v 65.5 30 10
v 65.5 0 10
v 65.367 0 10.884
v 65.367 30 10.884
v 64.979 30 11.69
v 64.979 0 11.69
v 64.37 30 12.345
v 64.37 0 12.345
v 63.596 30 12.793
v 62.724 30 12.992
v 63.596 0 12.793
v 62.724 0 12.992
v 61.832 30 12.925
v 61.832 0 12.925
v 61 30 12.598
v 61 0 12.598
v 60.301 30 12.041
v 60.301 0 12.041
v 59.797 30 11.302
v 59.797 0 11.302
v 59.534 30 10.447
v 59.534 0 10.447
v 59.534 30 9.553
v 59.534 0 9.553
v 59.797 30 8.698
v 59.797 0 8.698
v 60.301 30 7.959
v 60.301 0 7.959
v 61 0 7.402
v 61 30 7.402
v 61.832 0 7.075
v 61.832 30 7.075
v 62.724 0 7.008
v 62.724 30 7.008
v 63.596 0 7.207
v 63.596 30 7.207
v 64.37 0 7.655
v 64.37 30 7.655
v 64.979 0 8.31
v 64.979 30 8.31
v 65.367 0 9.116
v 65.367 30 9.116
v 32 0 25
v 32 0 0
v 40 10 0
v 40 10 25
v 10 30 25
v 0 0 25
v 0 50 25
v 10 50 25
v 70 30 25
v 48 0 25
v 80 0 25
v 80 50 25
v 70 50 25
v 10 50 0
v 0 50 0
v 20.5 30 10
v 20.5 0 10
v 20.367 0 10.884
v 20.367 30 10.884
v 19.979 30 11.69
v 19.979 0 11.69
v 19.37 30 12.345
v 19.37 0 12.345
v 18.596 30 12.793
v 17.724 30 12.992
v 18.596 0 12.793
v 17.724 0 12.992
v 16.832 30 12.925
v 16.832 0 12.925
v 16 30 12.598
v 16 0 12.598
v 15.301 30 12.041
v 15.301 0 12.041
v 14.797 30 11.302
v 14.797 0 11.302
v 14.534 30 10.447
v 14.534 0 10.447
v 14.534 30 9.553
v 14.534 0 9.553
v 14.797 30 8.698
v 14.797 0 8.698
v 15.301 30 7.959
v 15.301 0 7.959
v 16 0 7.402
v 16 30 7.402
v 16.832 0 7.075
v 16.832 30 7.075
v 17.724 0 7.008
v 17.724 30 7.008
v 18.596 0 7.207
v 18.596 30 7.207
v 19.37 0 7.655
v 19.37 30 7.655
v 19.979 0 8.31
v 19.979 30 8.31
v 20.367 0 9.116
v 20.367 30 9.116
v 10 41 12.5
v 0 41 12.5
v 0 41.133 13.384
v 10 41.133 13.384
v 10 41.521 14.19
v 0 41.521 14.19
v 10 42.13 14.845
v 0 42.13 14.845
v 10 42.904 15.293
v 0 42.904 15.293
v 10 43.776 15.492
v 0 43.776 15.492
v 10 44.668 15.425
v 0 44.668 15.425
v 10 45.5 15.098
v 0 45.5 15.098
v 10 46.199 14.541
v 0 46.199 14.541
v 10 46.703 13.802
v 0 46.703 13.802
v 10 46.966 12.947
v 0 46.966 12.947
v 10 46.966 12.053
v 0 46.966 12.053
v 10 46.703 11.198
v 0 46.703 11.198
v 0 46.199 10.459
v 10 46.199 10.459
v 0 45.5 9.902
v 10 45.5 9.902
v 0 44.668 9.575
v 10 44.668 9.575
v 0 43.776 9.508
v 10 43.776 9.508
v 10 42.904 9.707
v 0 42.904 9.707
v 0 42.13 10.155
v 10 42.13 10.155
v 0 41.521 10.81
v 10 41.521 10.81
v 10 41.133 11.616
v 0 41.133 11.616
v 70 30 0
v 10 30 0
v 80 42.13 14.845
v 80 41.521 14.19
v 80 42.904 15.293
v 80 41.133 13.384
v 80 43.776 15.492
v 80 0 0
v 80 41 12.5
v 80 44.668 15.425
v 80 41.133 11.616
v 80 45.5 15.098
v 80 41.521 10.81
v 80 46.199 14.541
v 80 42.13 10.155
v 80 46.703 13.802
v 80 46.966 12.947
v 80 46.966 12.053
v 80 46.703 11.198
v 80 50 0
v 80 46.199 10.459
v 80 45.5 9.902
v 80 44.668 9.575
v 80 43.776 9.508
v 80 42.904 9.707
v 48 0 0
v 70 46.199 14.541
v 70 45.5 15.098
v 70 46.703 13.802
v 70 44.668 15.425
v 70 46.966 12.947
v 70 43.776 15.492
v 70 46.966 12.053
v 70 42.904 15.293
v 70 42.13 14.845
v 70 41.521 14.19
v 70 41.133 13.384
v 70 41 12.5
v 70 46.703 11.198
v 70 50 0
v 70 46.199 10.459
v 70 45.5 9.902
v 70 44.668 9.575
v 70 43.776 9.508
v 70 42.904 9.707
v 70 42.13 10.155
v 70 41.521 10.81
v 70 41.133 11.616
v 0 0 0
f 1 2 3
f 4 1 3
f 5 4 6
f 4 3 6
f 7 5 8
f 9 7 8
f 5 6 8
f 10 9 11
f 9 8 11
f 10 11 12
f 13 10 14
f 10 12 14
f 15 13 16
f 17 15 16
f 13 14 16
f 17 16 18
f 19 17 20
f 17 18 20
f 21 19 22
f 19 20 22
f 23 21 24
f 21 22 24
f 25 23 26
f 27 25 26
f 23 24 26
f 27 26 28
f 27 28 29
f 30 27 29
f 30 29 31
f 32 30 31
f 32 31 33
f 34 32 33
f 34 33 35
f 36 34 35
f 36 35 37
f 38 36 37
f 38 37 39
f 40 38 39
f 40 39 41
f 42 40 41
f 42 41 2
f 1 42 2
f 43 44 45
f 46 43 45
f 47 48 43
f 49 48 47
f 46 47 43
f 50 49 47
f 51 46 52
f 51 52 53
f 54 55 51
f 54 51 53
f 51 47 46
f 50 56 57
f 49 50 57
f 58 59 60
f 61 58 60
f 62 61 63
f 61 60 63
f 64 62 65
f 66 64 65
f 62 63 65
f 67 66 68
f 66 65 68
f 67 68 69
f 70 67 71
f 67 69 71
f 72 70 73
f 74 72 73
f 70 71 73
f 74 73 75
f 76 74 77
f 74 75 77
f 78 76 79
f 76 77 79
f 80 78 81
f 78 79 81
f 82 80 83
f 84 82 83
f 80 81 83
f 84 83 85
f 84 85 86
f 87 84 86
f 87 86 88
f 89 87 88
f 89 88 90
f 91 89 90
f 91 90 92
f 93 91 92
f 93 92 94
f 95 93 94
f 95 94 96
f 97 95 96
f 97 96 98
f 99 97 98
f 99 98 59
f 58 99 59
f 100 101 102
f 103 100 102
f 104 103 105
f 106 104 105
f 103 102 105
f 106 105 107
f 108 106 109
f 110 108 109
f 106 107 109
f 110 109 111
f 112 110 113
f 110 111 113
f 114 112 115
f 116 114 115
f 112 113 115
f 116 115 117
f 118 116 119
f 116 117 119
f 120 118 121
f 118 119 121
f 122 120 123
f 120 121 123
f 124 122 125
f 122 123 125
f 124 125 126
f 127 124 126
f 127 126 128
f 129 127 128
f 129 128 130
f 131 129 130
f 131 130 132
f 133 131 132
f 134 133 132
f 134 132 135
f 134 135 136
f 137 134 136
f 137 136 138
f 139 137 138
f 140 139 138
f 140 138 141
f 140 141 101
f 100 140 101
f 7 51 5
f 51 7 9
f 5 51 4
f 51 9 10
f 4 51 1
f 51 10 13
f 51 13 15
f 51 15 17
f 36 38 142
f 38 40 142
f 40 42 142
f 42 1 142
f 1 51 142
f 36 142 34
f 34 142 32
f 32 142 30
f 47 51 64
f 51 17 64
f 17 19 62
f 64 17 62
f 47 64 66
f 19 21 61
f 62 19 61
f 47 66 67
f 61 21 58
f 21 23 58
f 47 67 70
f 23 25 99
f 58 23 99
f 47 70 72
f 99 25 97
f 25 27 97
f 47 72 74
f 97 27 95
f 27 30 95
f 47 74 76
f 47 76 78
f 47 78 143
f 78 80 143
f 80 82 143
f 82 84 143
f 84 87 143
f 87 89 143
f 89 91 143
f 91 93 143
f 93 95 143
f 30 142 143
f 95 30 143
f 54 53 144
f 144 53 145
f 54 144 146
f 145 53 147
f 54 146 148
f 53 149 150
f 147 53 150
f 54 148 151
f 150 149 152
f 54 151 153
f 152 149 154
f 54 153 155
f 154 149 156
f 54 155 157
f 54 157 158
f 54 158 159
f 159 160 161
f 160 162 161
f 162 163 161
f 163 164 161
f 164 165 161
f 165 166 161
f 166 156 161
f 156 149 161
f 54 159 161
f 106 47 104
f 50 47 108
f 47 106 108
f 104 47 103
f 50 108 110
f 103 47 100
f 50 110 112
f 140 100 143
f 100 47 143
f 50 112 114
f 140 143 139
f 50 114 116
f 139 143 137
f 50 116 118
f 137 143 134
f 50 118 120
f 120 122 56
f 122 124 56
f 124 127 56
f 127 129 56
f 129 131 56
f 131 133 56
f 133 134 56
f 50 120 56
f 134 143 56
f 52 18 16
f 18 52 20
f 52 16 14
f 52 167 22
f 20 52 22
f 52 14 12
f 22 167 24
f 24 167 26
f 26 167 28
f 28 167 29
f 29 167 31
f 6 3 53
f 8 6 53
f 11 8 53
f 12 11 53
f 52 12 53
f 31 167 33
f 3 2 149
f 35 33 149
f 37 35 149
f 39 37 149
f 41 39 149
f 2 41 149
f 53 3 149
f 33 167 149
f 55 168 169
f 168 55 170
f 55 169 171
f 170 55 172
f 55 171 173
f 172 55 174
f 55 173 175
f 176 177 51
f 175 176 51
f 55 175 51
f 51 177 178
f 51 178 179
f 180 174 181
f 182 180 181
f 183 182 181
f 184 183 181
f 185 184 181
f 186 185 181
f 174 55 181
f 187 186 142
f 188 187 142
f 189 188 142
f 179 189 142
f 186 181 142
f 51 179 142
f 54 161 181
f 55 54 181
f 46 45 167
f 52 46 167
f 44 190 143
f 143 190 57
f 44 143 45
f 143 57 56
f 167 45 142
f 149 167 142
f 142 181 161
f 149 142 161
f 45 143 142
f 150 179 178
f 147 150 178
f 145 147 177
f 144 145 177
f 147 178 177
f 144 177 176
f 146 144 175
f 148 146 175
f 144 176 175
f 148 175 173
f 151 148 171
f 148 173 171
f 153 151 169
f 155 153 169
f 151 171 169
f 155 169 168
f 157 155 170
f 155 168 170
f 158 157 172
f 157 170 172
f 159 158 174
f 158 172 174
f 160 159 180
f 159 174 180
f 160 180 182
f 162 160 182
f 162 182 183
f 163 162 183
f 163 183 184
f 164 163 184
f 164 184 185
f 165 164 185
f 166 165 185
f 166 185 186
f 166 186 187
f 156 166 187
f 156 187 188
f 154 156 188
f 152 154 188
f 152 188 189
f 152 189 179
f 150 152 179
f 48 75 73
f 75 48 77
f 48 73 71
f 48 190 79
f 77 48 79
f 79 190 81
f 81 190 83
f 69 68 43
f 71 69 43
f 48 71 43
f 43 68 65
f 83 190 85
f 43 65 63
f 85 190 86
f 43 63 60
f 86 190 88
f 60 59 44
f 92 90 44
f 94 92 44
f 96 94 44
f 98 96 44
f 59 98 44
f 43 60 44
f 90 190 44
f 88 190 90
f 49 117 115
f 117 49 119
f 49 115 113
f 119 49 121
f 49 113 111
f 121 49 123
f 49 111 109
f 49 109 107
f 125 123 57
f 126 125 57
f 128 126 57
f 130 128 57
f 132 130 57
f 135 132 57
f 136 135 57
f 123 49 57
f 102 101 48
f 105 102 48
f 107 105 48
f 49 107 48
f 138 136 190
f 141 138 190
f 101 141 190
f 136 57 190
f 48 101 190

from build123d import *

# Parameters (mm, degrees)
F1_DEPTH = 25
F2_R     = 3
F3_DEPTH = 50.001
F4_R     = 3
F5_DEPTH = 80.001


with BuildPart() as f1:
    # F0 (on Top) → F1 (new body)
    with BuildSketch(Plane.XY):
        Polygon((10, 50), (0, 50), (0, 0), (32, 0), (40, 10), (48, 0), (80, 0), (80, 50), (70, 50), (70, 30), (10, 30), align=None)
    extrude(amount=F1_DEPTH)

    # F2 (on face) → F3 (cut, through all)
    with BuildSketch(Plane.XZ):
        with Locations((17.5, 10)):
            Circle(F2_R)
        with Locations((62.5, 10)):
            Circle(F2_R)
    extrude(amount=-F3_DEPTH, mode=Mode.SUBTRACT)

    # F4 (on face) → F5 (cut, through all)
    with BuildSketch(Plane(origin=(0, 0, 0), x_dir=(0, -1, 0), z_dir=(-1, 0, 0))):
        with Locations((-44, 12.5)):
            Circle(F4_R)
    extrude(amount=-F5_DEPTH, mode=Mode.SUBTRACT)


solid = f1.part
